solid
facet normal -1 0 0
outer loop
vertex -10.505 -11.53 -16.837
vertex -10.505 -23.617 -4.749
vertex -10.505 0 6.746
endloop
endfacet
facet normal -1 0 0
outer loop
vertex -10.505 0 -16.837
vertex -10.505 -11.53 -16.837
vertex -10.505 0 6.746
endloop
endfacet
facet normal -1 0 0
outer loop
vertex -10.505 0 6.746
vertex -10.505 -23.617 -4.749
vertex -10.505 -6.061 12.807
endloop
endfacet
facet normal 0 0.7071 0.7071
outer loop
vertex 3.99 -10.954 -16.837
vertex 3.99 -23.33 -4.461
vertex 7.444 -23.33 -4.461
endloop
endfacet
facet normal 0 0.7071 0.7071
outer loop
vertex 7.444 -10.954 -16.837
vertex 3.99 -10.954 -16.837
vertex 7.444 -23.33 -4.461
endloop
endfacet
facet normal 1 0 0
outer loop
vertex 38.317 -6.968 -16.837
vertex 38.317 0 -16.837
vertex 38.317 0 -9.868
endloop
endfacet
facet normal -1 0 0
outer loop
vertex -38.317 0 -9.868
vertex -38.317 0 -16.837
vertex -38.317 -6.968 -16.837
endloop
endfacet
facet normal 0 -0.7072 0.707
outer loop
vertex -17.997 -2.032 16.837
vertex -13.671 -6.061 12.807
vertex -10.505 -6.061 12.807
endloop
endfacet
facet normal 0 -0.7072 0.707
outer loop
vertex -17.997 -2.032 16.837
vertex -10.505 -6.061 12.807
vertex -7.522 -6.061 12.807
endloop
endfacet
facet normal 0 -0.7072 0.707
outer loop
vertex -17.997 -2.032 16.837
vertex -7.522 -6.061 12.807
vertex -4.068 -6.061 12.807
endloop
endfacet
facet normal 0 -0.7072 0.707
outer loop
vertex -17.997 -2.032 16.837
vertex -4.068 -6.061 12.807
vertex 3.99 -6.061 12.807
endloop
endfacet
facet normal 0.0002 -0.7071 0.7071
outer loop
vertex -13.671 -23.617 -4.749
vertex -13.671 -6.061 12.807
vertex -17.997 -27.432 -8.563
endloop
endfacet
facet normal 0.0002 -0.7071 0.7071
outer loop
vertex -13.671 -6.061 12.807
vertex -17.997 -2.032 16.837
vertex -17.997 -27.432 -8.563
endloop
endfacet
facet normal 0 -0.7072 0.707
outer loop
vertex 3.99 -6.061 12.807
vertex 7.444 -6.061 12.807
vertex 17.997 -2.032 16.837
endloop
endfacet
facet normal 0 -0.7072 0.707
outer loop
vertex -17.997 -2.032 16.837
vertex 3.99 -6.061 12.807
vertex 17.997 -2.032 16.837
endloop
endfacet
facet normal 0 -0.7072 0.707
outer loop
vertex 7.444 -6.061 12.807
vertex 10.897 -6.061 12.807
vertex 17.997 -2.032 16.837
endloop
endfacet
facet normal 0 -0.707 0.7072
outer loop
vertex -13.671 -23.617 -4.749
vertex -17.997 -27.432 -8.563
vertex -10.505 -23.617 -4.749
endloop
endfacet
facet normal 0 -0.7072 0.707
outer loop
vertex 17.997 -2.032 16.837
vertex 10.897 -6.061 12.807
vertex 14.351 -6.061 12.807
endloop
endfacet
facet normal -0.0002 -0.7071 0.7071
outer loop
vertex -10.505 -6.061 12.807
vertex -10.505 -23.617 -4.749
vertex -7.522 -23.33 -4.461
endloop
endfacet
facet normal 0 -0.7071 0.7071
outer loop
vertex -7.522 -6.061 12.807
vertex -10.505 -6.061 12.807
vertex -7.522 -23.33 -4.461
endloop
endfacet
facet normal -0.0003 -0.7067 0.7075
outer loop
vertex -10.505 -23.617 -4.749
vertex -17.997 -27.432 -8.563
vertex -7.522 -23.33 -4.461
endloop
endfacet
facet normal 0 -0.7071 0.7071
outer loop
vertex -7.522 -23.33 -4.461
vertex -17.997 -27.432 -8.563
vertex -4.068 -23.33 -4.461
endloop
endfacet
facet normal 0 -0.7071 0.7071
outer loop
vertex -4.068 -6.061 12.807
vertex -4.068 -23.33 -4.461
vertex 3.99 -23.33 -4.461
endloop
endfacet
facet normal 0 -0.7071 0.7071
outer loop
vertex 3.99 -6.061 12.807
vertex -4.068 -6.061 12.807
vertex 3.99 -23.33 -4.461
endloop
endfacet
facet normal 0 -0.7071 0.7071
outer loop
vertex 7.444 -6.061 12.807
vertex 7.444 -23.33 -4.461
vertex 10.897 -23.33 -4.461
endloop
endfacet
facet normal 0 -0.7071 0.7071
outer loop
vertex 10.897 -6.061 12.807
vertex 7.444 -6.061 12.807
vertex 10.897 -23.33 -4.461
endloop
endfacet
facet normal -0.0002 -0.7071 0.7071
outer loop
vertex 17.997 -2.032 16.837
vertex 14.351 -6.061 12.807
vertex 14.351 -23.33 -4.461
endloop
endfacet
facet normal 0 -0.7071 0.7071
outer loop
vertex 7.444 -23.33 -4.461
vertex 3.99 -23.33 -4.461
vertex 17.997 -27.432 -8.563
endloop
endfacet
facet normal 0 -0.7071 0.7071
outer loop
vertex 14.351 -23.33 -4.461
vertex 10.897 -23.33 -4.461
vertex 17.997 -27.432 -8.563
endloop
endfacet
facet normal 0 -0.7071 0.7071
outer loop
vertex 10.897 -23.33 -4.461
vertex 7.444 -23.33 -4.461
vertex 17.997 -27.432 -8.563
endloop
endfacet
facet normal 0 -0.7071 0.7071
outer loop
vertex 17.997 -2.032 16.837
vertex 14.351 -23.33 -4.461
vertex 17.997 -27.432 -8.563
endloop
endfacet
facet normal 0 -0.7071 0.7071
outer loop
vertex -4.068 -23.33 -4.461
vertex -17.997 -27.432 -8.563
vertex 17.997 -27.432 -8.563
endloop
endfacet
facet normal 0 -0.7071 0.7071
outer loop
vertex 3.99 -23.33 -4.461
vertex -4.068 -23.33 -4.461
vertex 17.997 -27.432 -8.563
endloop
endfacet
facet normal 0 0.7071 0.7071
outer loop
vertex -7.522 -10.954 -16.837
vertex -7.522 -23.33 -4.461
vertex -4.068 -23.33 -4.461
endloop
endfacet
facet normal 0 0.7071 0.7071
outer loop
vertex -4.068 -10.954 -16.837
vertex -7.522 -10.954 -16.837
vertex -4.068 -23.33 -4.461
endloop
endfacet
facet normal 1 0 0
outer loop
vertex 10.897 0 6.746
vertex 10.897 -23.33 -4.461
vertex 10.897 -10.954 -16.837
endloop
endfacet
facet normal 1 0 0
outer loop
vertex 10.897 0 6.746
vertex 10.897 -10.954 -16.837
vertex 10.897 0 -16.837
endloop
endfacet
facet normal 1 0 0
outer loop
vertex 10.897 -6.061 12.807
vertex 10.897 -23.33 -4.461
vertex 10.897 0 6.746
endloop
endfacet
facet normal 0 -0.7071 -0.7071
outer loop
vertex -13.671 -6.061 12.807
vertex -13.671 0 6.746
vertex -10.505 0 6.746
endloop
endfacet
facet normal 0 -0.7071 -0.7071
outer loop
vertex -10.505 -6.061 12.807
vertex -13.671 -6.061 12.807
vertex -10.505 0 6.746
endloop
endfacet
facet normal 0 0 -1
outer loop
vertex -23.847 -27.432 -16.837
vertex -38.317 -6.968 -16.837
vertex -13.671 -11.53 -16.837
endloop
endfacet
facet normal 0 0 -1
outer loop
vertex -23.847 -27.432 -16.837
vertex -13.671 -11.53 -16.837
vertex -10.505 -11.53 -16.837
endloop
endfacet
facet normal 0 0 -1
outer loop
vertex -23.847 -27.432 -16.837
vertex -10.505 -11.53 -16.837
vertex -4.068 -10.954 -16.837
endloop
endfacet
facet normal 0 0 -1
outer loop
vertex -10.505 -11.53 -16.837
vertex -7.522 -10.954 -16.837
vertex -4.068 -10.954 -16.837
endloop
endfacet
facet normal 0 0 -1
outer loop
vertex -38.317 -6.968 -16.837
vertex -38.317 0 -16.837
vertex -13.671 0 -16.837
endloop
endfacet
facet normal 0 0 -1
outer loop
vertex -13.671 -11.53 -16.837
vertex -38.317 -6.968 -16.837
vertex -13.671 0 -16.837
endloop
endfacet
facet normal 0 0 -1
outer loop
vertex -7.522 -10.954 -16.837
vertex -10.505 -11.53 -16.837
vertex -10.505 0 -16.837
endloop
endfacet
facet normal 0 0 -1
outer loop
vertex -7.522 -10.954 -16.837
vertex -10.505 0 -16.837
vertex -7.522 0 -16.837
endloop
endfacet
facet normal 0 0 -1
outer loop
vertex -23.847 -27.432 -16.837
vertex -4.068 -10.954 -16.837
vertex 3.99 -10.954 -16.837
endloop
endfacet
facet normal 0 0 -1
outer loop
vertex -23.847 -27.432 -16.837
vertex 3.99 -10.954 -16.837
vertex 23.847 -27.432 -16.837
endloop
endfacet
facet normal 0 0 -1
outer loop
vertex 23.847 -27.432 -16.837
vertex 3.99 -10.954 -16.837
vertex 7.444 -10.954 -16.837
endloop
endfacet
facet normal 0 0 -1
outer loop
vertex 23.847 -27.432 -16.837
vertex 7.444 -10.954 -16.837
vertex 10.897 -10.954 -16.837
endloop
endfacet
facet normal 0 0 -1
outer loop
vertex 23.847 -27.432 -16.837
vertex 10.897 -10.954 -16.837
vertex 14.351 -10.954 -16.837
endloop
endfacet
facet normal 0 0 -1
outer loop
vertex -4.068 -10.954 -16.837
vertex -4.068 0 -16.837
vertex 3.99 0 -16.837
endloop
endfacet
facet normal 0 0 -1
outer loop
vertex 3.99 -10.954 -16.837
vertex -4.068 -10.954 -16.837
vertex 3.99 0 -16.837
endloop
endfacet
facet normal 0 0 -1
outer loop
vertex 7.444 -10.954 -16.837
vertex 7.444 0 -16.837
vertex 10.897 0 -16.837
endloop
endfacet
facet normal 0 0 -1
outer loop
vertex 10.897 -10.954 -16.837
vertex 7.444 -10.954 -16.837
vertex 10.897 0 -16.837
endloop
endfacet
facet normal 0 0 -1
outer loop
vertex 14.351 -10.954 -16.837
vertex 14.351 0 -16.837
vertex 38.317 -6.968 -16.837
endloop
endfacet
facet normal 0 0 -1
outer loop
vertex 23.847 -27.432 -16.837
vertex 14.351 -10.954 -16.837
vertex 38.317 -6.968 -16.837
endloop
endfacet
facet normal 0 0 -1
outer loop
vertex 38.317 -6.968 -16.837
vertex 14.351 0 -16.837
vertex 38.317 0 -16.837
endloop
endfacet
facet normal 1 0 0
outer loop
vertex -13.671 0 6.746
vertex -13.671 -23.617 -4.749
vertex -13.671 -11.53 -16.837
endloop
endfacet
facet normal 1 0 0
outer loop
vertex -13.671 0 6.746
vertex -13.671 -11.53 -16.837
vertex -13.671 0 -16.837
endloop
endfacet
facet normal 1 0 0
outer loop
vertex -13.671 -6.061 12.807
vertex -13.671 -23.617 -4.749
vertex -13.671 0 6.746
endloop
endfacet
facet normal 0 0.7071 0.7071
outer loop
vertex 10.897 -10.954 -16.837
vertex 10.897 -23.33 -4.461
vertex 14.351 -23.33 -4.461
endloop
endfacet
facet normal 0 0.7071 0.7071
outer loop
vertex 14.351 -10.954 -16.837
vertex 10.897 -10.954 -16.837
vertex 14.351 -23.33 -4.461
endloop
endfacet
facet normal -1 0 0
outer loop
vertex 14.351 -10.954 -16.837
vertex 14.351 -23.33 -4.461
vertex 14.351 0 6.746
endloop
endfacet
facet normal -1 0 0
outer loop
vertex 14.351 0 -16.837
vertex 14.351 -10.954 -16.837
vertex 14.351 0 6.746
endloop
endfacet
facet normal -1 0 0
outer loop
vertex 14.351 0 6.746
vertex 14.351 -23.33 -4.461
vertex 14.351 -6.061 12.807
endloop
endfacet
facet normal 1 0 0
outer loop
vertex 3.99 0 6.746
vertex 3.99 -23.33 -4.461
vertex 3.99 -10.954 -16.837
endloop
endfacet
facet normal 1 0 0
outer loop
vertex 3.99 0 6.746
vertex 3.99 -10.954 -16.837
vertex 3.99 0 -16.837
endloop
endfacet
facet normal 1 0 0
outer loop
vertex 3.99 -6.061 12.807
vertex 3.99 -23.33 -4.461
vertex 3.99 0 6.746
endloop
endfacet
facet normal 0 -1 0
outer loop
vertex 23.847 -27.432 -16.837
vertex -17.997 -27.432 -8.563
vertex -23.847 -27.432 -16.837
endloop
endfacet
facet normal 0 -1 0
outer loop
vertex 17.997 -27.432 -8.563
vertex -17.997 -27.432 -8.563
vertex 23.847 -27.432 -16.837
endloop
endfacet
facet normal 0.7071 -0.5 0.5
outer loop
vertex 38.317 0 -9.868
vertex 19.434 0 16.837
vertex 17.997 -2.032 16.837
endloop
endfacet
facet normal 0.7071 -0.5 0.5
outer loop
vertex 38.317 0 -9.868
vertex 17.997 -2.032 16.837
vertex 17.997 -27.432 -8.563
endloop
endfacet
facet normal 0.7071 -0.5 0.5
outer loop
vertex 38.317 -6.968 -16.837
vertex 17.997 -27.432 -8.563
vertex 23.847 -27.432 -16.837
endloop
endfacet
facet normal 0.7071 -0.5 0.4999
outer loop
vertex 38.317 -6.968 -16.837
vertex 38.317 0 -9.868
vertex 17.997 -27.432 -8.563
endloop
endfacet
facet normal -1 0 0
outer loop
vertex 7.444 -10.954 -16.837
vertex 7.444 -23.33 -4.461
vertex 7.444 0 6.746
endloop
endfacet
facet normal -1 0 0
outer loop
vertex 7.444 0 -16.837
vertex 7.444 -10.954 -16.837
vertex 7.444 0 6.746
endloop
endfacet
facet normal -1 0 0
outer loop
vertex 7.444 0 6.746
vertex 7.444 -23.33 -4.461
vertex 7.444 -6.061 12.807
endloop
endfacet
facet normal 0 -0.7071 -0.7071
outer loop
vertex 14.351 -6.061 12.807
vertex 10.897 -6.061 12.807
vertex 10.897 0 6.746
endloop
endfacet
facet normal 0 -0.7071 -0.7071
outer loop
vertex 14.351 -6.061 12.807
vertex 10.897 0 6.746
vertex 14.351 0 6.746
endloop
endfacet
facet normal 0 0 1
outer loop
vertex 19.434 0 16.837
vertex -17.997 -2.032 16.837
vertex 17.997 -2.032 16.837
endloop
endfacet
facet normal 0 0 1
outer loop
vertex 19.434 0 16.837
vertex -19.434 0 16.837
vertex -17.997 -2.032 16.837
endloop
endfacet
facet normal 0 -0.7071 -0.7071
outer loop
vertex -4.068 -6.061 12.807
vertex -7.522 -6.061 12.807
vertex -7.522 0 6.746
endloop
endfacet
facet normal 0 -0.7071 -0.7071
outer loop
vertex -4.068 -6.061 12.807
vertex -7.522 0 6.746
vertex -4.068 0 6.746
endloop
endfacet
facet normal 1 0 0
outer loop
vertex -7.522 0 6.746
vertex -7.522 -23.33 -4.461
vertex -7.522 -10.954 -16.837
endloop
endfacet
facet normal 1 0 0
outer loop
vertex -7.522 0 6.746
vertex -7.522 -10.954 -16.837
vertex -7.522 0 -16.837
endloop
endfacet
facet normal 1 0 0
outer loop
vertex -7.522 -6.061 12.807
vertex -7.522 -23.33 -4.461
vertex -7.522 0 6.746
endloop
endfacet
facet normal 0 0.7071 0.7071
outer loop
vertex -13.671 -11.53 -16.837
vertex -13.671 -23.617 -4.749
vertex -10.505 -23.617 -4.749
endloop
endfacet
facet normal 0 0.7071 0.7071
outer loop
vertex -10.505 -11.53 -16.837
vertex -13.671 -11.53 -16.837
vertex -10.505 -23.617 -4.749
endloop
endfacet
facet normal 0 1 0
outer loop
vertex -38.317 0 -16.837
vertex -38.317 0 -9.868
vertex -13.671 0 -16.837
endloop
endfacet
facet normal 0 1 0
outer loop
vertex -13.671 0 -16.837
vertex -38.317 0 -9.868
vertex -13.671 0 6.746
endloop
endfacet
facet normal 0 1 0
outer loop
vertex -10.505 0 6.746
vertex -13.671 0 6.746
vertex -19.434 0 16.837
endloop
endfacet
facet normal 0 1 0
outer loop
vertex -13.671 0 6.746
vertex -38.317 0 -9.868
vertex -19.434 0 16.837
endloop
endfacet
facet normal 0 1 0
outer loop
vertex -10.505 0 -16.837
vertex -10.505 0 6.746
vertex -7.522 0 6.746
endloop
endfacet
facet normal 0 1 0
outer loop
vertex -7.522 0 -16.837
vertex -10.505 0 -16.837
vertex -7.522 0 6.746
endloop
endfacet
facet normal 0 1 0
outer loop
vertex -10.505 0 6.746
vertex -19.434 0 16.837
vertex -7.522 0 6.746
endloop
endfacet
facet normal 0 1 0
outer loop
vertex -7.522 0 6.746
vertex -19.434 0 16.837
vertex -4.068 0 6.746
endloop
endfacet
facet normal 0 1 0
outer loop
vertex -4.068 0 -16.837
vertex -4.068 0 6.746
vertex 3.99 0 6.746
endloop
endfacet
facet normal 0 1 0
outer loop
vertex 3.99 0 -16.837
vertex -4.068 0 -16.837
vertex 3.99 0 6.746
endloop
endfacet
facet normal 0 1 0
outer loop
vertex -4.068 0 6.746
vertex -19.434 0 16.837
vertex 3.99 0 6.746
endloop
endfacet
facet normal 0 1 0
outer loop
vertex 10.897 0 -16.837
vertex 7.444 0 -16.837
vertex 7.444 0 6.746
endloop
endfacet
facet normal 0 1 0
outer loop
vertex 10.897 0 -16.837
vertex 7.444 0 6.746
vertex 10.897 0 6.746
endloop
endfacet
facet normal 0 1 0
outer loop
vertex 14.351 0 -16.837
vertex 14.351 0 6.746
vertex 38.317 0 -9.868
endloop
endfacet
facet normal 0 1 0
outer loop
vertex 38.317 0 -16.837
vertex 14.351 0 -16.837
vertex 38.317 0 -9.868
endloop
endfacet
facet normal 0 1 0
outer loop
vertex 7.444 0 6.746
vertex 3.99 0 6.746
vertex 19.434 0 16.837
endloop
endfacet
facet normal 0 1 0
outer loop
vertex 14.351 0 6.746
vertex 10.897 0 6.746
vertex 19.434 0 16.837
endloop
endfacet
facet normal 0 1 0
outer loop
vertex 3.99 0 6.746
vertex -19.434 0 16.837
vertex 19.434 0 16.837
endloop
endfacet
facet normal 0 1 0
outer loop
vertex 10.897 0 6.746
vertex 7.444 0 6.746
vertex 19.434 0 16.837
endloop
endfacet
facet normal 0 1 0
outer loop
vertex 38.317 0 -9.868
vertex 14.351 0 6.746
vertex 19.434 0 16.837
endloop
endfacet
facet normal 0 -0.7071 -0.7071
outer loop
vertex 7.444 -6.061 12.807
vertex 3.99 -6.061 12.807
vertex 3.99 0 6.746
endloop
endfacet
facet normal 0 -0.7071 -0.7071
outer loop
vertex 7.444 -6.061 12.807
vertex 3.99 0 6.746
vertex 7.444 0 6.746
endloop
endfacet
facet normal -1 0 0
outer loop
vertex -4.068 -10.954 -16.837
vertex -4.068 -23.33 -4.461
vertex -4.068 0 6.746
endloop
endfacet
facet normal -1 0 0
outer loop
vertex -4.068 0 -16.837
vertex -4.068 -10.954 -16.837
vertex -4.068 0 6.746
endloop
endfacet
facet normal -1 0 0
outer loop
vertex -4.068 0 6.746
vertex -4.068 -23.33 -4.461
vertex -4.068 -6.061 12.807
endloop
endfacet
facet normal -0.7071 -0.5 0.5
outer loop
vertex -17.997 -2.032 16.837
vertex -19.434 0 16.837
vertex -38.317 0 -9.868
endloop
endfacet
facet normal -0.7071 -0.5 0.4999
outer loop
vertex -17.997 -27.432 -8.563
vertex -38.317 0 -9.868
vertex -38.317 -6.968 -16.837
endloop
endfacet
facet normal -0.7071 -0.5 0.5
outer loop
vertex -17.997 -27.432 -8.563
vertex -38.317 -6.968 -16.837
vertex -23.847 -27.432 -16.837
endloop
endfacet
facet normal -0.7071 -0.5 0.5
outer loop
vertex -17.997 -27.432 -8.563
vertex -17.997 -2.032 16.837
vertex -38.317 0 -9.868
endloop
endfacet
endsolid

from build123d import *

# Parameters (mm, degrees)
F0_W      = 76.6343446126
F0_H      = 33.6732733995
F1_DEPTH  = 27.432
F2_SIZE   = 25.4
F3_SIZE   = 20.32
F4_W      = 3.1658643857
F4_H      = 24.8281476088
F5_DEPTH  = 25.4
F6_W      = 3.4536682069
F6_H      = 24.4211279787
F7_DEPTH  = 25.4
F8_W      = 3.4536719322
F8_H      = 24.4211279787
F9_DEPTH  = 25.4
F10_W     = 3.4536686726
F10_H     = 24.4211279787
F11_DEPTH = 25.4


with BuildPart() as f1:
    # F0 (on Front) → F1 (new body)
    with BuildSketch(Plane.XZ):
        Rectangle(F0_W, F0_H)
    extrude(amount=F1_DEPTH)

    # F2
    f2_edges = [f1.edges().sort_by_distance(p)[0] for p in [
        (0, -27.432, 16.836637),
    ]]
    chamfer(f2_edges, length=F2_SIZE)

    # F3
    f3_edges = [f1.edges().sort_by_distance(p)[0] for p in [
        (-38.317172, -14.732, 4.136637),
        (38.317172, -14.732, 4.136637),
    ]]
    chamfer(f3_edges, length=F3_SIZE)

    # F4 (on face) → F5 (cut)
    with BuildSketch(Plane(origin=(0, -9.4343183499, 9.4343183499), x_dir=(1, 0, 0), z_dir=(0, -0.7071067812, 0.7071067812))):
        with Locations((-12.0878419839, -7.6438782271)):
            Rectangle(F4_W, F4_H)
    extrude(amount=-F5_DEPTH, mode=Mode.SUBTRACT)

    # F6 (on face) → F7 (cut)
    with BuildSketch(Plane(origin=(0, -9.4343183499, 9.4343183499), x_dir=(1, 0, 0), z_dir=(0, -0.7071067812, 0.7071067812))):
        with Locations((-5.7953335345, -7.4403684121)):
            Rectangle(F6_W, F6_H)
    extrude(amount=-F7_DEPTH, mode=Mode.SUBTRACT)

    # F8 (on face) → F9 (cut)
    with BuildSketch(Plane(origin=(0, -9.4343183499, 9.4343183499), x_dir=(1, 0, 0), z_dir=(0, -0.7071067812, 0.7071067812))):
        with Locations((12.6242348924, -7.4403684121)):
            Rectangle(F8_W, F8_H)
    extrude(amount=-F9_DEPTH, mode=Mode.SUBTRACT)

    # F10 (on face) → F11 (cut)
    with BuildSketch(Plane(origin=(0, -9.4343183499, 9.4343183499), x_dir=(1, 0, 0), z_dir=(0, -0.7071067812, 0.7071067812))):
        with Locations((5.7168968488, -7.4403684121)):
            Rectangle(F10_W, F10_H)
    extrude(amount=-F11_DEPTH, mode=Mode.SUBTRACT)


solid = f1.part
